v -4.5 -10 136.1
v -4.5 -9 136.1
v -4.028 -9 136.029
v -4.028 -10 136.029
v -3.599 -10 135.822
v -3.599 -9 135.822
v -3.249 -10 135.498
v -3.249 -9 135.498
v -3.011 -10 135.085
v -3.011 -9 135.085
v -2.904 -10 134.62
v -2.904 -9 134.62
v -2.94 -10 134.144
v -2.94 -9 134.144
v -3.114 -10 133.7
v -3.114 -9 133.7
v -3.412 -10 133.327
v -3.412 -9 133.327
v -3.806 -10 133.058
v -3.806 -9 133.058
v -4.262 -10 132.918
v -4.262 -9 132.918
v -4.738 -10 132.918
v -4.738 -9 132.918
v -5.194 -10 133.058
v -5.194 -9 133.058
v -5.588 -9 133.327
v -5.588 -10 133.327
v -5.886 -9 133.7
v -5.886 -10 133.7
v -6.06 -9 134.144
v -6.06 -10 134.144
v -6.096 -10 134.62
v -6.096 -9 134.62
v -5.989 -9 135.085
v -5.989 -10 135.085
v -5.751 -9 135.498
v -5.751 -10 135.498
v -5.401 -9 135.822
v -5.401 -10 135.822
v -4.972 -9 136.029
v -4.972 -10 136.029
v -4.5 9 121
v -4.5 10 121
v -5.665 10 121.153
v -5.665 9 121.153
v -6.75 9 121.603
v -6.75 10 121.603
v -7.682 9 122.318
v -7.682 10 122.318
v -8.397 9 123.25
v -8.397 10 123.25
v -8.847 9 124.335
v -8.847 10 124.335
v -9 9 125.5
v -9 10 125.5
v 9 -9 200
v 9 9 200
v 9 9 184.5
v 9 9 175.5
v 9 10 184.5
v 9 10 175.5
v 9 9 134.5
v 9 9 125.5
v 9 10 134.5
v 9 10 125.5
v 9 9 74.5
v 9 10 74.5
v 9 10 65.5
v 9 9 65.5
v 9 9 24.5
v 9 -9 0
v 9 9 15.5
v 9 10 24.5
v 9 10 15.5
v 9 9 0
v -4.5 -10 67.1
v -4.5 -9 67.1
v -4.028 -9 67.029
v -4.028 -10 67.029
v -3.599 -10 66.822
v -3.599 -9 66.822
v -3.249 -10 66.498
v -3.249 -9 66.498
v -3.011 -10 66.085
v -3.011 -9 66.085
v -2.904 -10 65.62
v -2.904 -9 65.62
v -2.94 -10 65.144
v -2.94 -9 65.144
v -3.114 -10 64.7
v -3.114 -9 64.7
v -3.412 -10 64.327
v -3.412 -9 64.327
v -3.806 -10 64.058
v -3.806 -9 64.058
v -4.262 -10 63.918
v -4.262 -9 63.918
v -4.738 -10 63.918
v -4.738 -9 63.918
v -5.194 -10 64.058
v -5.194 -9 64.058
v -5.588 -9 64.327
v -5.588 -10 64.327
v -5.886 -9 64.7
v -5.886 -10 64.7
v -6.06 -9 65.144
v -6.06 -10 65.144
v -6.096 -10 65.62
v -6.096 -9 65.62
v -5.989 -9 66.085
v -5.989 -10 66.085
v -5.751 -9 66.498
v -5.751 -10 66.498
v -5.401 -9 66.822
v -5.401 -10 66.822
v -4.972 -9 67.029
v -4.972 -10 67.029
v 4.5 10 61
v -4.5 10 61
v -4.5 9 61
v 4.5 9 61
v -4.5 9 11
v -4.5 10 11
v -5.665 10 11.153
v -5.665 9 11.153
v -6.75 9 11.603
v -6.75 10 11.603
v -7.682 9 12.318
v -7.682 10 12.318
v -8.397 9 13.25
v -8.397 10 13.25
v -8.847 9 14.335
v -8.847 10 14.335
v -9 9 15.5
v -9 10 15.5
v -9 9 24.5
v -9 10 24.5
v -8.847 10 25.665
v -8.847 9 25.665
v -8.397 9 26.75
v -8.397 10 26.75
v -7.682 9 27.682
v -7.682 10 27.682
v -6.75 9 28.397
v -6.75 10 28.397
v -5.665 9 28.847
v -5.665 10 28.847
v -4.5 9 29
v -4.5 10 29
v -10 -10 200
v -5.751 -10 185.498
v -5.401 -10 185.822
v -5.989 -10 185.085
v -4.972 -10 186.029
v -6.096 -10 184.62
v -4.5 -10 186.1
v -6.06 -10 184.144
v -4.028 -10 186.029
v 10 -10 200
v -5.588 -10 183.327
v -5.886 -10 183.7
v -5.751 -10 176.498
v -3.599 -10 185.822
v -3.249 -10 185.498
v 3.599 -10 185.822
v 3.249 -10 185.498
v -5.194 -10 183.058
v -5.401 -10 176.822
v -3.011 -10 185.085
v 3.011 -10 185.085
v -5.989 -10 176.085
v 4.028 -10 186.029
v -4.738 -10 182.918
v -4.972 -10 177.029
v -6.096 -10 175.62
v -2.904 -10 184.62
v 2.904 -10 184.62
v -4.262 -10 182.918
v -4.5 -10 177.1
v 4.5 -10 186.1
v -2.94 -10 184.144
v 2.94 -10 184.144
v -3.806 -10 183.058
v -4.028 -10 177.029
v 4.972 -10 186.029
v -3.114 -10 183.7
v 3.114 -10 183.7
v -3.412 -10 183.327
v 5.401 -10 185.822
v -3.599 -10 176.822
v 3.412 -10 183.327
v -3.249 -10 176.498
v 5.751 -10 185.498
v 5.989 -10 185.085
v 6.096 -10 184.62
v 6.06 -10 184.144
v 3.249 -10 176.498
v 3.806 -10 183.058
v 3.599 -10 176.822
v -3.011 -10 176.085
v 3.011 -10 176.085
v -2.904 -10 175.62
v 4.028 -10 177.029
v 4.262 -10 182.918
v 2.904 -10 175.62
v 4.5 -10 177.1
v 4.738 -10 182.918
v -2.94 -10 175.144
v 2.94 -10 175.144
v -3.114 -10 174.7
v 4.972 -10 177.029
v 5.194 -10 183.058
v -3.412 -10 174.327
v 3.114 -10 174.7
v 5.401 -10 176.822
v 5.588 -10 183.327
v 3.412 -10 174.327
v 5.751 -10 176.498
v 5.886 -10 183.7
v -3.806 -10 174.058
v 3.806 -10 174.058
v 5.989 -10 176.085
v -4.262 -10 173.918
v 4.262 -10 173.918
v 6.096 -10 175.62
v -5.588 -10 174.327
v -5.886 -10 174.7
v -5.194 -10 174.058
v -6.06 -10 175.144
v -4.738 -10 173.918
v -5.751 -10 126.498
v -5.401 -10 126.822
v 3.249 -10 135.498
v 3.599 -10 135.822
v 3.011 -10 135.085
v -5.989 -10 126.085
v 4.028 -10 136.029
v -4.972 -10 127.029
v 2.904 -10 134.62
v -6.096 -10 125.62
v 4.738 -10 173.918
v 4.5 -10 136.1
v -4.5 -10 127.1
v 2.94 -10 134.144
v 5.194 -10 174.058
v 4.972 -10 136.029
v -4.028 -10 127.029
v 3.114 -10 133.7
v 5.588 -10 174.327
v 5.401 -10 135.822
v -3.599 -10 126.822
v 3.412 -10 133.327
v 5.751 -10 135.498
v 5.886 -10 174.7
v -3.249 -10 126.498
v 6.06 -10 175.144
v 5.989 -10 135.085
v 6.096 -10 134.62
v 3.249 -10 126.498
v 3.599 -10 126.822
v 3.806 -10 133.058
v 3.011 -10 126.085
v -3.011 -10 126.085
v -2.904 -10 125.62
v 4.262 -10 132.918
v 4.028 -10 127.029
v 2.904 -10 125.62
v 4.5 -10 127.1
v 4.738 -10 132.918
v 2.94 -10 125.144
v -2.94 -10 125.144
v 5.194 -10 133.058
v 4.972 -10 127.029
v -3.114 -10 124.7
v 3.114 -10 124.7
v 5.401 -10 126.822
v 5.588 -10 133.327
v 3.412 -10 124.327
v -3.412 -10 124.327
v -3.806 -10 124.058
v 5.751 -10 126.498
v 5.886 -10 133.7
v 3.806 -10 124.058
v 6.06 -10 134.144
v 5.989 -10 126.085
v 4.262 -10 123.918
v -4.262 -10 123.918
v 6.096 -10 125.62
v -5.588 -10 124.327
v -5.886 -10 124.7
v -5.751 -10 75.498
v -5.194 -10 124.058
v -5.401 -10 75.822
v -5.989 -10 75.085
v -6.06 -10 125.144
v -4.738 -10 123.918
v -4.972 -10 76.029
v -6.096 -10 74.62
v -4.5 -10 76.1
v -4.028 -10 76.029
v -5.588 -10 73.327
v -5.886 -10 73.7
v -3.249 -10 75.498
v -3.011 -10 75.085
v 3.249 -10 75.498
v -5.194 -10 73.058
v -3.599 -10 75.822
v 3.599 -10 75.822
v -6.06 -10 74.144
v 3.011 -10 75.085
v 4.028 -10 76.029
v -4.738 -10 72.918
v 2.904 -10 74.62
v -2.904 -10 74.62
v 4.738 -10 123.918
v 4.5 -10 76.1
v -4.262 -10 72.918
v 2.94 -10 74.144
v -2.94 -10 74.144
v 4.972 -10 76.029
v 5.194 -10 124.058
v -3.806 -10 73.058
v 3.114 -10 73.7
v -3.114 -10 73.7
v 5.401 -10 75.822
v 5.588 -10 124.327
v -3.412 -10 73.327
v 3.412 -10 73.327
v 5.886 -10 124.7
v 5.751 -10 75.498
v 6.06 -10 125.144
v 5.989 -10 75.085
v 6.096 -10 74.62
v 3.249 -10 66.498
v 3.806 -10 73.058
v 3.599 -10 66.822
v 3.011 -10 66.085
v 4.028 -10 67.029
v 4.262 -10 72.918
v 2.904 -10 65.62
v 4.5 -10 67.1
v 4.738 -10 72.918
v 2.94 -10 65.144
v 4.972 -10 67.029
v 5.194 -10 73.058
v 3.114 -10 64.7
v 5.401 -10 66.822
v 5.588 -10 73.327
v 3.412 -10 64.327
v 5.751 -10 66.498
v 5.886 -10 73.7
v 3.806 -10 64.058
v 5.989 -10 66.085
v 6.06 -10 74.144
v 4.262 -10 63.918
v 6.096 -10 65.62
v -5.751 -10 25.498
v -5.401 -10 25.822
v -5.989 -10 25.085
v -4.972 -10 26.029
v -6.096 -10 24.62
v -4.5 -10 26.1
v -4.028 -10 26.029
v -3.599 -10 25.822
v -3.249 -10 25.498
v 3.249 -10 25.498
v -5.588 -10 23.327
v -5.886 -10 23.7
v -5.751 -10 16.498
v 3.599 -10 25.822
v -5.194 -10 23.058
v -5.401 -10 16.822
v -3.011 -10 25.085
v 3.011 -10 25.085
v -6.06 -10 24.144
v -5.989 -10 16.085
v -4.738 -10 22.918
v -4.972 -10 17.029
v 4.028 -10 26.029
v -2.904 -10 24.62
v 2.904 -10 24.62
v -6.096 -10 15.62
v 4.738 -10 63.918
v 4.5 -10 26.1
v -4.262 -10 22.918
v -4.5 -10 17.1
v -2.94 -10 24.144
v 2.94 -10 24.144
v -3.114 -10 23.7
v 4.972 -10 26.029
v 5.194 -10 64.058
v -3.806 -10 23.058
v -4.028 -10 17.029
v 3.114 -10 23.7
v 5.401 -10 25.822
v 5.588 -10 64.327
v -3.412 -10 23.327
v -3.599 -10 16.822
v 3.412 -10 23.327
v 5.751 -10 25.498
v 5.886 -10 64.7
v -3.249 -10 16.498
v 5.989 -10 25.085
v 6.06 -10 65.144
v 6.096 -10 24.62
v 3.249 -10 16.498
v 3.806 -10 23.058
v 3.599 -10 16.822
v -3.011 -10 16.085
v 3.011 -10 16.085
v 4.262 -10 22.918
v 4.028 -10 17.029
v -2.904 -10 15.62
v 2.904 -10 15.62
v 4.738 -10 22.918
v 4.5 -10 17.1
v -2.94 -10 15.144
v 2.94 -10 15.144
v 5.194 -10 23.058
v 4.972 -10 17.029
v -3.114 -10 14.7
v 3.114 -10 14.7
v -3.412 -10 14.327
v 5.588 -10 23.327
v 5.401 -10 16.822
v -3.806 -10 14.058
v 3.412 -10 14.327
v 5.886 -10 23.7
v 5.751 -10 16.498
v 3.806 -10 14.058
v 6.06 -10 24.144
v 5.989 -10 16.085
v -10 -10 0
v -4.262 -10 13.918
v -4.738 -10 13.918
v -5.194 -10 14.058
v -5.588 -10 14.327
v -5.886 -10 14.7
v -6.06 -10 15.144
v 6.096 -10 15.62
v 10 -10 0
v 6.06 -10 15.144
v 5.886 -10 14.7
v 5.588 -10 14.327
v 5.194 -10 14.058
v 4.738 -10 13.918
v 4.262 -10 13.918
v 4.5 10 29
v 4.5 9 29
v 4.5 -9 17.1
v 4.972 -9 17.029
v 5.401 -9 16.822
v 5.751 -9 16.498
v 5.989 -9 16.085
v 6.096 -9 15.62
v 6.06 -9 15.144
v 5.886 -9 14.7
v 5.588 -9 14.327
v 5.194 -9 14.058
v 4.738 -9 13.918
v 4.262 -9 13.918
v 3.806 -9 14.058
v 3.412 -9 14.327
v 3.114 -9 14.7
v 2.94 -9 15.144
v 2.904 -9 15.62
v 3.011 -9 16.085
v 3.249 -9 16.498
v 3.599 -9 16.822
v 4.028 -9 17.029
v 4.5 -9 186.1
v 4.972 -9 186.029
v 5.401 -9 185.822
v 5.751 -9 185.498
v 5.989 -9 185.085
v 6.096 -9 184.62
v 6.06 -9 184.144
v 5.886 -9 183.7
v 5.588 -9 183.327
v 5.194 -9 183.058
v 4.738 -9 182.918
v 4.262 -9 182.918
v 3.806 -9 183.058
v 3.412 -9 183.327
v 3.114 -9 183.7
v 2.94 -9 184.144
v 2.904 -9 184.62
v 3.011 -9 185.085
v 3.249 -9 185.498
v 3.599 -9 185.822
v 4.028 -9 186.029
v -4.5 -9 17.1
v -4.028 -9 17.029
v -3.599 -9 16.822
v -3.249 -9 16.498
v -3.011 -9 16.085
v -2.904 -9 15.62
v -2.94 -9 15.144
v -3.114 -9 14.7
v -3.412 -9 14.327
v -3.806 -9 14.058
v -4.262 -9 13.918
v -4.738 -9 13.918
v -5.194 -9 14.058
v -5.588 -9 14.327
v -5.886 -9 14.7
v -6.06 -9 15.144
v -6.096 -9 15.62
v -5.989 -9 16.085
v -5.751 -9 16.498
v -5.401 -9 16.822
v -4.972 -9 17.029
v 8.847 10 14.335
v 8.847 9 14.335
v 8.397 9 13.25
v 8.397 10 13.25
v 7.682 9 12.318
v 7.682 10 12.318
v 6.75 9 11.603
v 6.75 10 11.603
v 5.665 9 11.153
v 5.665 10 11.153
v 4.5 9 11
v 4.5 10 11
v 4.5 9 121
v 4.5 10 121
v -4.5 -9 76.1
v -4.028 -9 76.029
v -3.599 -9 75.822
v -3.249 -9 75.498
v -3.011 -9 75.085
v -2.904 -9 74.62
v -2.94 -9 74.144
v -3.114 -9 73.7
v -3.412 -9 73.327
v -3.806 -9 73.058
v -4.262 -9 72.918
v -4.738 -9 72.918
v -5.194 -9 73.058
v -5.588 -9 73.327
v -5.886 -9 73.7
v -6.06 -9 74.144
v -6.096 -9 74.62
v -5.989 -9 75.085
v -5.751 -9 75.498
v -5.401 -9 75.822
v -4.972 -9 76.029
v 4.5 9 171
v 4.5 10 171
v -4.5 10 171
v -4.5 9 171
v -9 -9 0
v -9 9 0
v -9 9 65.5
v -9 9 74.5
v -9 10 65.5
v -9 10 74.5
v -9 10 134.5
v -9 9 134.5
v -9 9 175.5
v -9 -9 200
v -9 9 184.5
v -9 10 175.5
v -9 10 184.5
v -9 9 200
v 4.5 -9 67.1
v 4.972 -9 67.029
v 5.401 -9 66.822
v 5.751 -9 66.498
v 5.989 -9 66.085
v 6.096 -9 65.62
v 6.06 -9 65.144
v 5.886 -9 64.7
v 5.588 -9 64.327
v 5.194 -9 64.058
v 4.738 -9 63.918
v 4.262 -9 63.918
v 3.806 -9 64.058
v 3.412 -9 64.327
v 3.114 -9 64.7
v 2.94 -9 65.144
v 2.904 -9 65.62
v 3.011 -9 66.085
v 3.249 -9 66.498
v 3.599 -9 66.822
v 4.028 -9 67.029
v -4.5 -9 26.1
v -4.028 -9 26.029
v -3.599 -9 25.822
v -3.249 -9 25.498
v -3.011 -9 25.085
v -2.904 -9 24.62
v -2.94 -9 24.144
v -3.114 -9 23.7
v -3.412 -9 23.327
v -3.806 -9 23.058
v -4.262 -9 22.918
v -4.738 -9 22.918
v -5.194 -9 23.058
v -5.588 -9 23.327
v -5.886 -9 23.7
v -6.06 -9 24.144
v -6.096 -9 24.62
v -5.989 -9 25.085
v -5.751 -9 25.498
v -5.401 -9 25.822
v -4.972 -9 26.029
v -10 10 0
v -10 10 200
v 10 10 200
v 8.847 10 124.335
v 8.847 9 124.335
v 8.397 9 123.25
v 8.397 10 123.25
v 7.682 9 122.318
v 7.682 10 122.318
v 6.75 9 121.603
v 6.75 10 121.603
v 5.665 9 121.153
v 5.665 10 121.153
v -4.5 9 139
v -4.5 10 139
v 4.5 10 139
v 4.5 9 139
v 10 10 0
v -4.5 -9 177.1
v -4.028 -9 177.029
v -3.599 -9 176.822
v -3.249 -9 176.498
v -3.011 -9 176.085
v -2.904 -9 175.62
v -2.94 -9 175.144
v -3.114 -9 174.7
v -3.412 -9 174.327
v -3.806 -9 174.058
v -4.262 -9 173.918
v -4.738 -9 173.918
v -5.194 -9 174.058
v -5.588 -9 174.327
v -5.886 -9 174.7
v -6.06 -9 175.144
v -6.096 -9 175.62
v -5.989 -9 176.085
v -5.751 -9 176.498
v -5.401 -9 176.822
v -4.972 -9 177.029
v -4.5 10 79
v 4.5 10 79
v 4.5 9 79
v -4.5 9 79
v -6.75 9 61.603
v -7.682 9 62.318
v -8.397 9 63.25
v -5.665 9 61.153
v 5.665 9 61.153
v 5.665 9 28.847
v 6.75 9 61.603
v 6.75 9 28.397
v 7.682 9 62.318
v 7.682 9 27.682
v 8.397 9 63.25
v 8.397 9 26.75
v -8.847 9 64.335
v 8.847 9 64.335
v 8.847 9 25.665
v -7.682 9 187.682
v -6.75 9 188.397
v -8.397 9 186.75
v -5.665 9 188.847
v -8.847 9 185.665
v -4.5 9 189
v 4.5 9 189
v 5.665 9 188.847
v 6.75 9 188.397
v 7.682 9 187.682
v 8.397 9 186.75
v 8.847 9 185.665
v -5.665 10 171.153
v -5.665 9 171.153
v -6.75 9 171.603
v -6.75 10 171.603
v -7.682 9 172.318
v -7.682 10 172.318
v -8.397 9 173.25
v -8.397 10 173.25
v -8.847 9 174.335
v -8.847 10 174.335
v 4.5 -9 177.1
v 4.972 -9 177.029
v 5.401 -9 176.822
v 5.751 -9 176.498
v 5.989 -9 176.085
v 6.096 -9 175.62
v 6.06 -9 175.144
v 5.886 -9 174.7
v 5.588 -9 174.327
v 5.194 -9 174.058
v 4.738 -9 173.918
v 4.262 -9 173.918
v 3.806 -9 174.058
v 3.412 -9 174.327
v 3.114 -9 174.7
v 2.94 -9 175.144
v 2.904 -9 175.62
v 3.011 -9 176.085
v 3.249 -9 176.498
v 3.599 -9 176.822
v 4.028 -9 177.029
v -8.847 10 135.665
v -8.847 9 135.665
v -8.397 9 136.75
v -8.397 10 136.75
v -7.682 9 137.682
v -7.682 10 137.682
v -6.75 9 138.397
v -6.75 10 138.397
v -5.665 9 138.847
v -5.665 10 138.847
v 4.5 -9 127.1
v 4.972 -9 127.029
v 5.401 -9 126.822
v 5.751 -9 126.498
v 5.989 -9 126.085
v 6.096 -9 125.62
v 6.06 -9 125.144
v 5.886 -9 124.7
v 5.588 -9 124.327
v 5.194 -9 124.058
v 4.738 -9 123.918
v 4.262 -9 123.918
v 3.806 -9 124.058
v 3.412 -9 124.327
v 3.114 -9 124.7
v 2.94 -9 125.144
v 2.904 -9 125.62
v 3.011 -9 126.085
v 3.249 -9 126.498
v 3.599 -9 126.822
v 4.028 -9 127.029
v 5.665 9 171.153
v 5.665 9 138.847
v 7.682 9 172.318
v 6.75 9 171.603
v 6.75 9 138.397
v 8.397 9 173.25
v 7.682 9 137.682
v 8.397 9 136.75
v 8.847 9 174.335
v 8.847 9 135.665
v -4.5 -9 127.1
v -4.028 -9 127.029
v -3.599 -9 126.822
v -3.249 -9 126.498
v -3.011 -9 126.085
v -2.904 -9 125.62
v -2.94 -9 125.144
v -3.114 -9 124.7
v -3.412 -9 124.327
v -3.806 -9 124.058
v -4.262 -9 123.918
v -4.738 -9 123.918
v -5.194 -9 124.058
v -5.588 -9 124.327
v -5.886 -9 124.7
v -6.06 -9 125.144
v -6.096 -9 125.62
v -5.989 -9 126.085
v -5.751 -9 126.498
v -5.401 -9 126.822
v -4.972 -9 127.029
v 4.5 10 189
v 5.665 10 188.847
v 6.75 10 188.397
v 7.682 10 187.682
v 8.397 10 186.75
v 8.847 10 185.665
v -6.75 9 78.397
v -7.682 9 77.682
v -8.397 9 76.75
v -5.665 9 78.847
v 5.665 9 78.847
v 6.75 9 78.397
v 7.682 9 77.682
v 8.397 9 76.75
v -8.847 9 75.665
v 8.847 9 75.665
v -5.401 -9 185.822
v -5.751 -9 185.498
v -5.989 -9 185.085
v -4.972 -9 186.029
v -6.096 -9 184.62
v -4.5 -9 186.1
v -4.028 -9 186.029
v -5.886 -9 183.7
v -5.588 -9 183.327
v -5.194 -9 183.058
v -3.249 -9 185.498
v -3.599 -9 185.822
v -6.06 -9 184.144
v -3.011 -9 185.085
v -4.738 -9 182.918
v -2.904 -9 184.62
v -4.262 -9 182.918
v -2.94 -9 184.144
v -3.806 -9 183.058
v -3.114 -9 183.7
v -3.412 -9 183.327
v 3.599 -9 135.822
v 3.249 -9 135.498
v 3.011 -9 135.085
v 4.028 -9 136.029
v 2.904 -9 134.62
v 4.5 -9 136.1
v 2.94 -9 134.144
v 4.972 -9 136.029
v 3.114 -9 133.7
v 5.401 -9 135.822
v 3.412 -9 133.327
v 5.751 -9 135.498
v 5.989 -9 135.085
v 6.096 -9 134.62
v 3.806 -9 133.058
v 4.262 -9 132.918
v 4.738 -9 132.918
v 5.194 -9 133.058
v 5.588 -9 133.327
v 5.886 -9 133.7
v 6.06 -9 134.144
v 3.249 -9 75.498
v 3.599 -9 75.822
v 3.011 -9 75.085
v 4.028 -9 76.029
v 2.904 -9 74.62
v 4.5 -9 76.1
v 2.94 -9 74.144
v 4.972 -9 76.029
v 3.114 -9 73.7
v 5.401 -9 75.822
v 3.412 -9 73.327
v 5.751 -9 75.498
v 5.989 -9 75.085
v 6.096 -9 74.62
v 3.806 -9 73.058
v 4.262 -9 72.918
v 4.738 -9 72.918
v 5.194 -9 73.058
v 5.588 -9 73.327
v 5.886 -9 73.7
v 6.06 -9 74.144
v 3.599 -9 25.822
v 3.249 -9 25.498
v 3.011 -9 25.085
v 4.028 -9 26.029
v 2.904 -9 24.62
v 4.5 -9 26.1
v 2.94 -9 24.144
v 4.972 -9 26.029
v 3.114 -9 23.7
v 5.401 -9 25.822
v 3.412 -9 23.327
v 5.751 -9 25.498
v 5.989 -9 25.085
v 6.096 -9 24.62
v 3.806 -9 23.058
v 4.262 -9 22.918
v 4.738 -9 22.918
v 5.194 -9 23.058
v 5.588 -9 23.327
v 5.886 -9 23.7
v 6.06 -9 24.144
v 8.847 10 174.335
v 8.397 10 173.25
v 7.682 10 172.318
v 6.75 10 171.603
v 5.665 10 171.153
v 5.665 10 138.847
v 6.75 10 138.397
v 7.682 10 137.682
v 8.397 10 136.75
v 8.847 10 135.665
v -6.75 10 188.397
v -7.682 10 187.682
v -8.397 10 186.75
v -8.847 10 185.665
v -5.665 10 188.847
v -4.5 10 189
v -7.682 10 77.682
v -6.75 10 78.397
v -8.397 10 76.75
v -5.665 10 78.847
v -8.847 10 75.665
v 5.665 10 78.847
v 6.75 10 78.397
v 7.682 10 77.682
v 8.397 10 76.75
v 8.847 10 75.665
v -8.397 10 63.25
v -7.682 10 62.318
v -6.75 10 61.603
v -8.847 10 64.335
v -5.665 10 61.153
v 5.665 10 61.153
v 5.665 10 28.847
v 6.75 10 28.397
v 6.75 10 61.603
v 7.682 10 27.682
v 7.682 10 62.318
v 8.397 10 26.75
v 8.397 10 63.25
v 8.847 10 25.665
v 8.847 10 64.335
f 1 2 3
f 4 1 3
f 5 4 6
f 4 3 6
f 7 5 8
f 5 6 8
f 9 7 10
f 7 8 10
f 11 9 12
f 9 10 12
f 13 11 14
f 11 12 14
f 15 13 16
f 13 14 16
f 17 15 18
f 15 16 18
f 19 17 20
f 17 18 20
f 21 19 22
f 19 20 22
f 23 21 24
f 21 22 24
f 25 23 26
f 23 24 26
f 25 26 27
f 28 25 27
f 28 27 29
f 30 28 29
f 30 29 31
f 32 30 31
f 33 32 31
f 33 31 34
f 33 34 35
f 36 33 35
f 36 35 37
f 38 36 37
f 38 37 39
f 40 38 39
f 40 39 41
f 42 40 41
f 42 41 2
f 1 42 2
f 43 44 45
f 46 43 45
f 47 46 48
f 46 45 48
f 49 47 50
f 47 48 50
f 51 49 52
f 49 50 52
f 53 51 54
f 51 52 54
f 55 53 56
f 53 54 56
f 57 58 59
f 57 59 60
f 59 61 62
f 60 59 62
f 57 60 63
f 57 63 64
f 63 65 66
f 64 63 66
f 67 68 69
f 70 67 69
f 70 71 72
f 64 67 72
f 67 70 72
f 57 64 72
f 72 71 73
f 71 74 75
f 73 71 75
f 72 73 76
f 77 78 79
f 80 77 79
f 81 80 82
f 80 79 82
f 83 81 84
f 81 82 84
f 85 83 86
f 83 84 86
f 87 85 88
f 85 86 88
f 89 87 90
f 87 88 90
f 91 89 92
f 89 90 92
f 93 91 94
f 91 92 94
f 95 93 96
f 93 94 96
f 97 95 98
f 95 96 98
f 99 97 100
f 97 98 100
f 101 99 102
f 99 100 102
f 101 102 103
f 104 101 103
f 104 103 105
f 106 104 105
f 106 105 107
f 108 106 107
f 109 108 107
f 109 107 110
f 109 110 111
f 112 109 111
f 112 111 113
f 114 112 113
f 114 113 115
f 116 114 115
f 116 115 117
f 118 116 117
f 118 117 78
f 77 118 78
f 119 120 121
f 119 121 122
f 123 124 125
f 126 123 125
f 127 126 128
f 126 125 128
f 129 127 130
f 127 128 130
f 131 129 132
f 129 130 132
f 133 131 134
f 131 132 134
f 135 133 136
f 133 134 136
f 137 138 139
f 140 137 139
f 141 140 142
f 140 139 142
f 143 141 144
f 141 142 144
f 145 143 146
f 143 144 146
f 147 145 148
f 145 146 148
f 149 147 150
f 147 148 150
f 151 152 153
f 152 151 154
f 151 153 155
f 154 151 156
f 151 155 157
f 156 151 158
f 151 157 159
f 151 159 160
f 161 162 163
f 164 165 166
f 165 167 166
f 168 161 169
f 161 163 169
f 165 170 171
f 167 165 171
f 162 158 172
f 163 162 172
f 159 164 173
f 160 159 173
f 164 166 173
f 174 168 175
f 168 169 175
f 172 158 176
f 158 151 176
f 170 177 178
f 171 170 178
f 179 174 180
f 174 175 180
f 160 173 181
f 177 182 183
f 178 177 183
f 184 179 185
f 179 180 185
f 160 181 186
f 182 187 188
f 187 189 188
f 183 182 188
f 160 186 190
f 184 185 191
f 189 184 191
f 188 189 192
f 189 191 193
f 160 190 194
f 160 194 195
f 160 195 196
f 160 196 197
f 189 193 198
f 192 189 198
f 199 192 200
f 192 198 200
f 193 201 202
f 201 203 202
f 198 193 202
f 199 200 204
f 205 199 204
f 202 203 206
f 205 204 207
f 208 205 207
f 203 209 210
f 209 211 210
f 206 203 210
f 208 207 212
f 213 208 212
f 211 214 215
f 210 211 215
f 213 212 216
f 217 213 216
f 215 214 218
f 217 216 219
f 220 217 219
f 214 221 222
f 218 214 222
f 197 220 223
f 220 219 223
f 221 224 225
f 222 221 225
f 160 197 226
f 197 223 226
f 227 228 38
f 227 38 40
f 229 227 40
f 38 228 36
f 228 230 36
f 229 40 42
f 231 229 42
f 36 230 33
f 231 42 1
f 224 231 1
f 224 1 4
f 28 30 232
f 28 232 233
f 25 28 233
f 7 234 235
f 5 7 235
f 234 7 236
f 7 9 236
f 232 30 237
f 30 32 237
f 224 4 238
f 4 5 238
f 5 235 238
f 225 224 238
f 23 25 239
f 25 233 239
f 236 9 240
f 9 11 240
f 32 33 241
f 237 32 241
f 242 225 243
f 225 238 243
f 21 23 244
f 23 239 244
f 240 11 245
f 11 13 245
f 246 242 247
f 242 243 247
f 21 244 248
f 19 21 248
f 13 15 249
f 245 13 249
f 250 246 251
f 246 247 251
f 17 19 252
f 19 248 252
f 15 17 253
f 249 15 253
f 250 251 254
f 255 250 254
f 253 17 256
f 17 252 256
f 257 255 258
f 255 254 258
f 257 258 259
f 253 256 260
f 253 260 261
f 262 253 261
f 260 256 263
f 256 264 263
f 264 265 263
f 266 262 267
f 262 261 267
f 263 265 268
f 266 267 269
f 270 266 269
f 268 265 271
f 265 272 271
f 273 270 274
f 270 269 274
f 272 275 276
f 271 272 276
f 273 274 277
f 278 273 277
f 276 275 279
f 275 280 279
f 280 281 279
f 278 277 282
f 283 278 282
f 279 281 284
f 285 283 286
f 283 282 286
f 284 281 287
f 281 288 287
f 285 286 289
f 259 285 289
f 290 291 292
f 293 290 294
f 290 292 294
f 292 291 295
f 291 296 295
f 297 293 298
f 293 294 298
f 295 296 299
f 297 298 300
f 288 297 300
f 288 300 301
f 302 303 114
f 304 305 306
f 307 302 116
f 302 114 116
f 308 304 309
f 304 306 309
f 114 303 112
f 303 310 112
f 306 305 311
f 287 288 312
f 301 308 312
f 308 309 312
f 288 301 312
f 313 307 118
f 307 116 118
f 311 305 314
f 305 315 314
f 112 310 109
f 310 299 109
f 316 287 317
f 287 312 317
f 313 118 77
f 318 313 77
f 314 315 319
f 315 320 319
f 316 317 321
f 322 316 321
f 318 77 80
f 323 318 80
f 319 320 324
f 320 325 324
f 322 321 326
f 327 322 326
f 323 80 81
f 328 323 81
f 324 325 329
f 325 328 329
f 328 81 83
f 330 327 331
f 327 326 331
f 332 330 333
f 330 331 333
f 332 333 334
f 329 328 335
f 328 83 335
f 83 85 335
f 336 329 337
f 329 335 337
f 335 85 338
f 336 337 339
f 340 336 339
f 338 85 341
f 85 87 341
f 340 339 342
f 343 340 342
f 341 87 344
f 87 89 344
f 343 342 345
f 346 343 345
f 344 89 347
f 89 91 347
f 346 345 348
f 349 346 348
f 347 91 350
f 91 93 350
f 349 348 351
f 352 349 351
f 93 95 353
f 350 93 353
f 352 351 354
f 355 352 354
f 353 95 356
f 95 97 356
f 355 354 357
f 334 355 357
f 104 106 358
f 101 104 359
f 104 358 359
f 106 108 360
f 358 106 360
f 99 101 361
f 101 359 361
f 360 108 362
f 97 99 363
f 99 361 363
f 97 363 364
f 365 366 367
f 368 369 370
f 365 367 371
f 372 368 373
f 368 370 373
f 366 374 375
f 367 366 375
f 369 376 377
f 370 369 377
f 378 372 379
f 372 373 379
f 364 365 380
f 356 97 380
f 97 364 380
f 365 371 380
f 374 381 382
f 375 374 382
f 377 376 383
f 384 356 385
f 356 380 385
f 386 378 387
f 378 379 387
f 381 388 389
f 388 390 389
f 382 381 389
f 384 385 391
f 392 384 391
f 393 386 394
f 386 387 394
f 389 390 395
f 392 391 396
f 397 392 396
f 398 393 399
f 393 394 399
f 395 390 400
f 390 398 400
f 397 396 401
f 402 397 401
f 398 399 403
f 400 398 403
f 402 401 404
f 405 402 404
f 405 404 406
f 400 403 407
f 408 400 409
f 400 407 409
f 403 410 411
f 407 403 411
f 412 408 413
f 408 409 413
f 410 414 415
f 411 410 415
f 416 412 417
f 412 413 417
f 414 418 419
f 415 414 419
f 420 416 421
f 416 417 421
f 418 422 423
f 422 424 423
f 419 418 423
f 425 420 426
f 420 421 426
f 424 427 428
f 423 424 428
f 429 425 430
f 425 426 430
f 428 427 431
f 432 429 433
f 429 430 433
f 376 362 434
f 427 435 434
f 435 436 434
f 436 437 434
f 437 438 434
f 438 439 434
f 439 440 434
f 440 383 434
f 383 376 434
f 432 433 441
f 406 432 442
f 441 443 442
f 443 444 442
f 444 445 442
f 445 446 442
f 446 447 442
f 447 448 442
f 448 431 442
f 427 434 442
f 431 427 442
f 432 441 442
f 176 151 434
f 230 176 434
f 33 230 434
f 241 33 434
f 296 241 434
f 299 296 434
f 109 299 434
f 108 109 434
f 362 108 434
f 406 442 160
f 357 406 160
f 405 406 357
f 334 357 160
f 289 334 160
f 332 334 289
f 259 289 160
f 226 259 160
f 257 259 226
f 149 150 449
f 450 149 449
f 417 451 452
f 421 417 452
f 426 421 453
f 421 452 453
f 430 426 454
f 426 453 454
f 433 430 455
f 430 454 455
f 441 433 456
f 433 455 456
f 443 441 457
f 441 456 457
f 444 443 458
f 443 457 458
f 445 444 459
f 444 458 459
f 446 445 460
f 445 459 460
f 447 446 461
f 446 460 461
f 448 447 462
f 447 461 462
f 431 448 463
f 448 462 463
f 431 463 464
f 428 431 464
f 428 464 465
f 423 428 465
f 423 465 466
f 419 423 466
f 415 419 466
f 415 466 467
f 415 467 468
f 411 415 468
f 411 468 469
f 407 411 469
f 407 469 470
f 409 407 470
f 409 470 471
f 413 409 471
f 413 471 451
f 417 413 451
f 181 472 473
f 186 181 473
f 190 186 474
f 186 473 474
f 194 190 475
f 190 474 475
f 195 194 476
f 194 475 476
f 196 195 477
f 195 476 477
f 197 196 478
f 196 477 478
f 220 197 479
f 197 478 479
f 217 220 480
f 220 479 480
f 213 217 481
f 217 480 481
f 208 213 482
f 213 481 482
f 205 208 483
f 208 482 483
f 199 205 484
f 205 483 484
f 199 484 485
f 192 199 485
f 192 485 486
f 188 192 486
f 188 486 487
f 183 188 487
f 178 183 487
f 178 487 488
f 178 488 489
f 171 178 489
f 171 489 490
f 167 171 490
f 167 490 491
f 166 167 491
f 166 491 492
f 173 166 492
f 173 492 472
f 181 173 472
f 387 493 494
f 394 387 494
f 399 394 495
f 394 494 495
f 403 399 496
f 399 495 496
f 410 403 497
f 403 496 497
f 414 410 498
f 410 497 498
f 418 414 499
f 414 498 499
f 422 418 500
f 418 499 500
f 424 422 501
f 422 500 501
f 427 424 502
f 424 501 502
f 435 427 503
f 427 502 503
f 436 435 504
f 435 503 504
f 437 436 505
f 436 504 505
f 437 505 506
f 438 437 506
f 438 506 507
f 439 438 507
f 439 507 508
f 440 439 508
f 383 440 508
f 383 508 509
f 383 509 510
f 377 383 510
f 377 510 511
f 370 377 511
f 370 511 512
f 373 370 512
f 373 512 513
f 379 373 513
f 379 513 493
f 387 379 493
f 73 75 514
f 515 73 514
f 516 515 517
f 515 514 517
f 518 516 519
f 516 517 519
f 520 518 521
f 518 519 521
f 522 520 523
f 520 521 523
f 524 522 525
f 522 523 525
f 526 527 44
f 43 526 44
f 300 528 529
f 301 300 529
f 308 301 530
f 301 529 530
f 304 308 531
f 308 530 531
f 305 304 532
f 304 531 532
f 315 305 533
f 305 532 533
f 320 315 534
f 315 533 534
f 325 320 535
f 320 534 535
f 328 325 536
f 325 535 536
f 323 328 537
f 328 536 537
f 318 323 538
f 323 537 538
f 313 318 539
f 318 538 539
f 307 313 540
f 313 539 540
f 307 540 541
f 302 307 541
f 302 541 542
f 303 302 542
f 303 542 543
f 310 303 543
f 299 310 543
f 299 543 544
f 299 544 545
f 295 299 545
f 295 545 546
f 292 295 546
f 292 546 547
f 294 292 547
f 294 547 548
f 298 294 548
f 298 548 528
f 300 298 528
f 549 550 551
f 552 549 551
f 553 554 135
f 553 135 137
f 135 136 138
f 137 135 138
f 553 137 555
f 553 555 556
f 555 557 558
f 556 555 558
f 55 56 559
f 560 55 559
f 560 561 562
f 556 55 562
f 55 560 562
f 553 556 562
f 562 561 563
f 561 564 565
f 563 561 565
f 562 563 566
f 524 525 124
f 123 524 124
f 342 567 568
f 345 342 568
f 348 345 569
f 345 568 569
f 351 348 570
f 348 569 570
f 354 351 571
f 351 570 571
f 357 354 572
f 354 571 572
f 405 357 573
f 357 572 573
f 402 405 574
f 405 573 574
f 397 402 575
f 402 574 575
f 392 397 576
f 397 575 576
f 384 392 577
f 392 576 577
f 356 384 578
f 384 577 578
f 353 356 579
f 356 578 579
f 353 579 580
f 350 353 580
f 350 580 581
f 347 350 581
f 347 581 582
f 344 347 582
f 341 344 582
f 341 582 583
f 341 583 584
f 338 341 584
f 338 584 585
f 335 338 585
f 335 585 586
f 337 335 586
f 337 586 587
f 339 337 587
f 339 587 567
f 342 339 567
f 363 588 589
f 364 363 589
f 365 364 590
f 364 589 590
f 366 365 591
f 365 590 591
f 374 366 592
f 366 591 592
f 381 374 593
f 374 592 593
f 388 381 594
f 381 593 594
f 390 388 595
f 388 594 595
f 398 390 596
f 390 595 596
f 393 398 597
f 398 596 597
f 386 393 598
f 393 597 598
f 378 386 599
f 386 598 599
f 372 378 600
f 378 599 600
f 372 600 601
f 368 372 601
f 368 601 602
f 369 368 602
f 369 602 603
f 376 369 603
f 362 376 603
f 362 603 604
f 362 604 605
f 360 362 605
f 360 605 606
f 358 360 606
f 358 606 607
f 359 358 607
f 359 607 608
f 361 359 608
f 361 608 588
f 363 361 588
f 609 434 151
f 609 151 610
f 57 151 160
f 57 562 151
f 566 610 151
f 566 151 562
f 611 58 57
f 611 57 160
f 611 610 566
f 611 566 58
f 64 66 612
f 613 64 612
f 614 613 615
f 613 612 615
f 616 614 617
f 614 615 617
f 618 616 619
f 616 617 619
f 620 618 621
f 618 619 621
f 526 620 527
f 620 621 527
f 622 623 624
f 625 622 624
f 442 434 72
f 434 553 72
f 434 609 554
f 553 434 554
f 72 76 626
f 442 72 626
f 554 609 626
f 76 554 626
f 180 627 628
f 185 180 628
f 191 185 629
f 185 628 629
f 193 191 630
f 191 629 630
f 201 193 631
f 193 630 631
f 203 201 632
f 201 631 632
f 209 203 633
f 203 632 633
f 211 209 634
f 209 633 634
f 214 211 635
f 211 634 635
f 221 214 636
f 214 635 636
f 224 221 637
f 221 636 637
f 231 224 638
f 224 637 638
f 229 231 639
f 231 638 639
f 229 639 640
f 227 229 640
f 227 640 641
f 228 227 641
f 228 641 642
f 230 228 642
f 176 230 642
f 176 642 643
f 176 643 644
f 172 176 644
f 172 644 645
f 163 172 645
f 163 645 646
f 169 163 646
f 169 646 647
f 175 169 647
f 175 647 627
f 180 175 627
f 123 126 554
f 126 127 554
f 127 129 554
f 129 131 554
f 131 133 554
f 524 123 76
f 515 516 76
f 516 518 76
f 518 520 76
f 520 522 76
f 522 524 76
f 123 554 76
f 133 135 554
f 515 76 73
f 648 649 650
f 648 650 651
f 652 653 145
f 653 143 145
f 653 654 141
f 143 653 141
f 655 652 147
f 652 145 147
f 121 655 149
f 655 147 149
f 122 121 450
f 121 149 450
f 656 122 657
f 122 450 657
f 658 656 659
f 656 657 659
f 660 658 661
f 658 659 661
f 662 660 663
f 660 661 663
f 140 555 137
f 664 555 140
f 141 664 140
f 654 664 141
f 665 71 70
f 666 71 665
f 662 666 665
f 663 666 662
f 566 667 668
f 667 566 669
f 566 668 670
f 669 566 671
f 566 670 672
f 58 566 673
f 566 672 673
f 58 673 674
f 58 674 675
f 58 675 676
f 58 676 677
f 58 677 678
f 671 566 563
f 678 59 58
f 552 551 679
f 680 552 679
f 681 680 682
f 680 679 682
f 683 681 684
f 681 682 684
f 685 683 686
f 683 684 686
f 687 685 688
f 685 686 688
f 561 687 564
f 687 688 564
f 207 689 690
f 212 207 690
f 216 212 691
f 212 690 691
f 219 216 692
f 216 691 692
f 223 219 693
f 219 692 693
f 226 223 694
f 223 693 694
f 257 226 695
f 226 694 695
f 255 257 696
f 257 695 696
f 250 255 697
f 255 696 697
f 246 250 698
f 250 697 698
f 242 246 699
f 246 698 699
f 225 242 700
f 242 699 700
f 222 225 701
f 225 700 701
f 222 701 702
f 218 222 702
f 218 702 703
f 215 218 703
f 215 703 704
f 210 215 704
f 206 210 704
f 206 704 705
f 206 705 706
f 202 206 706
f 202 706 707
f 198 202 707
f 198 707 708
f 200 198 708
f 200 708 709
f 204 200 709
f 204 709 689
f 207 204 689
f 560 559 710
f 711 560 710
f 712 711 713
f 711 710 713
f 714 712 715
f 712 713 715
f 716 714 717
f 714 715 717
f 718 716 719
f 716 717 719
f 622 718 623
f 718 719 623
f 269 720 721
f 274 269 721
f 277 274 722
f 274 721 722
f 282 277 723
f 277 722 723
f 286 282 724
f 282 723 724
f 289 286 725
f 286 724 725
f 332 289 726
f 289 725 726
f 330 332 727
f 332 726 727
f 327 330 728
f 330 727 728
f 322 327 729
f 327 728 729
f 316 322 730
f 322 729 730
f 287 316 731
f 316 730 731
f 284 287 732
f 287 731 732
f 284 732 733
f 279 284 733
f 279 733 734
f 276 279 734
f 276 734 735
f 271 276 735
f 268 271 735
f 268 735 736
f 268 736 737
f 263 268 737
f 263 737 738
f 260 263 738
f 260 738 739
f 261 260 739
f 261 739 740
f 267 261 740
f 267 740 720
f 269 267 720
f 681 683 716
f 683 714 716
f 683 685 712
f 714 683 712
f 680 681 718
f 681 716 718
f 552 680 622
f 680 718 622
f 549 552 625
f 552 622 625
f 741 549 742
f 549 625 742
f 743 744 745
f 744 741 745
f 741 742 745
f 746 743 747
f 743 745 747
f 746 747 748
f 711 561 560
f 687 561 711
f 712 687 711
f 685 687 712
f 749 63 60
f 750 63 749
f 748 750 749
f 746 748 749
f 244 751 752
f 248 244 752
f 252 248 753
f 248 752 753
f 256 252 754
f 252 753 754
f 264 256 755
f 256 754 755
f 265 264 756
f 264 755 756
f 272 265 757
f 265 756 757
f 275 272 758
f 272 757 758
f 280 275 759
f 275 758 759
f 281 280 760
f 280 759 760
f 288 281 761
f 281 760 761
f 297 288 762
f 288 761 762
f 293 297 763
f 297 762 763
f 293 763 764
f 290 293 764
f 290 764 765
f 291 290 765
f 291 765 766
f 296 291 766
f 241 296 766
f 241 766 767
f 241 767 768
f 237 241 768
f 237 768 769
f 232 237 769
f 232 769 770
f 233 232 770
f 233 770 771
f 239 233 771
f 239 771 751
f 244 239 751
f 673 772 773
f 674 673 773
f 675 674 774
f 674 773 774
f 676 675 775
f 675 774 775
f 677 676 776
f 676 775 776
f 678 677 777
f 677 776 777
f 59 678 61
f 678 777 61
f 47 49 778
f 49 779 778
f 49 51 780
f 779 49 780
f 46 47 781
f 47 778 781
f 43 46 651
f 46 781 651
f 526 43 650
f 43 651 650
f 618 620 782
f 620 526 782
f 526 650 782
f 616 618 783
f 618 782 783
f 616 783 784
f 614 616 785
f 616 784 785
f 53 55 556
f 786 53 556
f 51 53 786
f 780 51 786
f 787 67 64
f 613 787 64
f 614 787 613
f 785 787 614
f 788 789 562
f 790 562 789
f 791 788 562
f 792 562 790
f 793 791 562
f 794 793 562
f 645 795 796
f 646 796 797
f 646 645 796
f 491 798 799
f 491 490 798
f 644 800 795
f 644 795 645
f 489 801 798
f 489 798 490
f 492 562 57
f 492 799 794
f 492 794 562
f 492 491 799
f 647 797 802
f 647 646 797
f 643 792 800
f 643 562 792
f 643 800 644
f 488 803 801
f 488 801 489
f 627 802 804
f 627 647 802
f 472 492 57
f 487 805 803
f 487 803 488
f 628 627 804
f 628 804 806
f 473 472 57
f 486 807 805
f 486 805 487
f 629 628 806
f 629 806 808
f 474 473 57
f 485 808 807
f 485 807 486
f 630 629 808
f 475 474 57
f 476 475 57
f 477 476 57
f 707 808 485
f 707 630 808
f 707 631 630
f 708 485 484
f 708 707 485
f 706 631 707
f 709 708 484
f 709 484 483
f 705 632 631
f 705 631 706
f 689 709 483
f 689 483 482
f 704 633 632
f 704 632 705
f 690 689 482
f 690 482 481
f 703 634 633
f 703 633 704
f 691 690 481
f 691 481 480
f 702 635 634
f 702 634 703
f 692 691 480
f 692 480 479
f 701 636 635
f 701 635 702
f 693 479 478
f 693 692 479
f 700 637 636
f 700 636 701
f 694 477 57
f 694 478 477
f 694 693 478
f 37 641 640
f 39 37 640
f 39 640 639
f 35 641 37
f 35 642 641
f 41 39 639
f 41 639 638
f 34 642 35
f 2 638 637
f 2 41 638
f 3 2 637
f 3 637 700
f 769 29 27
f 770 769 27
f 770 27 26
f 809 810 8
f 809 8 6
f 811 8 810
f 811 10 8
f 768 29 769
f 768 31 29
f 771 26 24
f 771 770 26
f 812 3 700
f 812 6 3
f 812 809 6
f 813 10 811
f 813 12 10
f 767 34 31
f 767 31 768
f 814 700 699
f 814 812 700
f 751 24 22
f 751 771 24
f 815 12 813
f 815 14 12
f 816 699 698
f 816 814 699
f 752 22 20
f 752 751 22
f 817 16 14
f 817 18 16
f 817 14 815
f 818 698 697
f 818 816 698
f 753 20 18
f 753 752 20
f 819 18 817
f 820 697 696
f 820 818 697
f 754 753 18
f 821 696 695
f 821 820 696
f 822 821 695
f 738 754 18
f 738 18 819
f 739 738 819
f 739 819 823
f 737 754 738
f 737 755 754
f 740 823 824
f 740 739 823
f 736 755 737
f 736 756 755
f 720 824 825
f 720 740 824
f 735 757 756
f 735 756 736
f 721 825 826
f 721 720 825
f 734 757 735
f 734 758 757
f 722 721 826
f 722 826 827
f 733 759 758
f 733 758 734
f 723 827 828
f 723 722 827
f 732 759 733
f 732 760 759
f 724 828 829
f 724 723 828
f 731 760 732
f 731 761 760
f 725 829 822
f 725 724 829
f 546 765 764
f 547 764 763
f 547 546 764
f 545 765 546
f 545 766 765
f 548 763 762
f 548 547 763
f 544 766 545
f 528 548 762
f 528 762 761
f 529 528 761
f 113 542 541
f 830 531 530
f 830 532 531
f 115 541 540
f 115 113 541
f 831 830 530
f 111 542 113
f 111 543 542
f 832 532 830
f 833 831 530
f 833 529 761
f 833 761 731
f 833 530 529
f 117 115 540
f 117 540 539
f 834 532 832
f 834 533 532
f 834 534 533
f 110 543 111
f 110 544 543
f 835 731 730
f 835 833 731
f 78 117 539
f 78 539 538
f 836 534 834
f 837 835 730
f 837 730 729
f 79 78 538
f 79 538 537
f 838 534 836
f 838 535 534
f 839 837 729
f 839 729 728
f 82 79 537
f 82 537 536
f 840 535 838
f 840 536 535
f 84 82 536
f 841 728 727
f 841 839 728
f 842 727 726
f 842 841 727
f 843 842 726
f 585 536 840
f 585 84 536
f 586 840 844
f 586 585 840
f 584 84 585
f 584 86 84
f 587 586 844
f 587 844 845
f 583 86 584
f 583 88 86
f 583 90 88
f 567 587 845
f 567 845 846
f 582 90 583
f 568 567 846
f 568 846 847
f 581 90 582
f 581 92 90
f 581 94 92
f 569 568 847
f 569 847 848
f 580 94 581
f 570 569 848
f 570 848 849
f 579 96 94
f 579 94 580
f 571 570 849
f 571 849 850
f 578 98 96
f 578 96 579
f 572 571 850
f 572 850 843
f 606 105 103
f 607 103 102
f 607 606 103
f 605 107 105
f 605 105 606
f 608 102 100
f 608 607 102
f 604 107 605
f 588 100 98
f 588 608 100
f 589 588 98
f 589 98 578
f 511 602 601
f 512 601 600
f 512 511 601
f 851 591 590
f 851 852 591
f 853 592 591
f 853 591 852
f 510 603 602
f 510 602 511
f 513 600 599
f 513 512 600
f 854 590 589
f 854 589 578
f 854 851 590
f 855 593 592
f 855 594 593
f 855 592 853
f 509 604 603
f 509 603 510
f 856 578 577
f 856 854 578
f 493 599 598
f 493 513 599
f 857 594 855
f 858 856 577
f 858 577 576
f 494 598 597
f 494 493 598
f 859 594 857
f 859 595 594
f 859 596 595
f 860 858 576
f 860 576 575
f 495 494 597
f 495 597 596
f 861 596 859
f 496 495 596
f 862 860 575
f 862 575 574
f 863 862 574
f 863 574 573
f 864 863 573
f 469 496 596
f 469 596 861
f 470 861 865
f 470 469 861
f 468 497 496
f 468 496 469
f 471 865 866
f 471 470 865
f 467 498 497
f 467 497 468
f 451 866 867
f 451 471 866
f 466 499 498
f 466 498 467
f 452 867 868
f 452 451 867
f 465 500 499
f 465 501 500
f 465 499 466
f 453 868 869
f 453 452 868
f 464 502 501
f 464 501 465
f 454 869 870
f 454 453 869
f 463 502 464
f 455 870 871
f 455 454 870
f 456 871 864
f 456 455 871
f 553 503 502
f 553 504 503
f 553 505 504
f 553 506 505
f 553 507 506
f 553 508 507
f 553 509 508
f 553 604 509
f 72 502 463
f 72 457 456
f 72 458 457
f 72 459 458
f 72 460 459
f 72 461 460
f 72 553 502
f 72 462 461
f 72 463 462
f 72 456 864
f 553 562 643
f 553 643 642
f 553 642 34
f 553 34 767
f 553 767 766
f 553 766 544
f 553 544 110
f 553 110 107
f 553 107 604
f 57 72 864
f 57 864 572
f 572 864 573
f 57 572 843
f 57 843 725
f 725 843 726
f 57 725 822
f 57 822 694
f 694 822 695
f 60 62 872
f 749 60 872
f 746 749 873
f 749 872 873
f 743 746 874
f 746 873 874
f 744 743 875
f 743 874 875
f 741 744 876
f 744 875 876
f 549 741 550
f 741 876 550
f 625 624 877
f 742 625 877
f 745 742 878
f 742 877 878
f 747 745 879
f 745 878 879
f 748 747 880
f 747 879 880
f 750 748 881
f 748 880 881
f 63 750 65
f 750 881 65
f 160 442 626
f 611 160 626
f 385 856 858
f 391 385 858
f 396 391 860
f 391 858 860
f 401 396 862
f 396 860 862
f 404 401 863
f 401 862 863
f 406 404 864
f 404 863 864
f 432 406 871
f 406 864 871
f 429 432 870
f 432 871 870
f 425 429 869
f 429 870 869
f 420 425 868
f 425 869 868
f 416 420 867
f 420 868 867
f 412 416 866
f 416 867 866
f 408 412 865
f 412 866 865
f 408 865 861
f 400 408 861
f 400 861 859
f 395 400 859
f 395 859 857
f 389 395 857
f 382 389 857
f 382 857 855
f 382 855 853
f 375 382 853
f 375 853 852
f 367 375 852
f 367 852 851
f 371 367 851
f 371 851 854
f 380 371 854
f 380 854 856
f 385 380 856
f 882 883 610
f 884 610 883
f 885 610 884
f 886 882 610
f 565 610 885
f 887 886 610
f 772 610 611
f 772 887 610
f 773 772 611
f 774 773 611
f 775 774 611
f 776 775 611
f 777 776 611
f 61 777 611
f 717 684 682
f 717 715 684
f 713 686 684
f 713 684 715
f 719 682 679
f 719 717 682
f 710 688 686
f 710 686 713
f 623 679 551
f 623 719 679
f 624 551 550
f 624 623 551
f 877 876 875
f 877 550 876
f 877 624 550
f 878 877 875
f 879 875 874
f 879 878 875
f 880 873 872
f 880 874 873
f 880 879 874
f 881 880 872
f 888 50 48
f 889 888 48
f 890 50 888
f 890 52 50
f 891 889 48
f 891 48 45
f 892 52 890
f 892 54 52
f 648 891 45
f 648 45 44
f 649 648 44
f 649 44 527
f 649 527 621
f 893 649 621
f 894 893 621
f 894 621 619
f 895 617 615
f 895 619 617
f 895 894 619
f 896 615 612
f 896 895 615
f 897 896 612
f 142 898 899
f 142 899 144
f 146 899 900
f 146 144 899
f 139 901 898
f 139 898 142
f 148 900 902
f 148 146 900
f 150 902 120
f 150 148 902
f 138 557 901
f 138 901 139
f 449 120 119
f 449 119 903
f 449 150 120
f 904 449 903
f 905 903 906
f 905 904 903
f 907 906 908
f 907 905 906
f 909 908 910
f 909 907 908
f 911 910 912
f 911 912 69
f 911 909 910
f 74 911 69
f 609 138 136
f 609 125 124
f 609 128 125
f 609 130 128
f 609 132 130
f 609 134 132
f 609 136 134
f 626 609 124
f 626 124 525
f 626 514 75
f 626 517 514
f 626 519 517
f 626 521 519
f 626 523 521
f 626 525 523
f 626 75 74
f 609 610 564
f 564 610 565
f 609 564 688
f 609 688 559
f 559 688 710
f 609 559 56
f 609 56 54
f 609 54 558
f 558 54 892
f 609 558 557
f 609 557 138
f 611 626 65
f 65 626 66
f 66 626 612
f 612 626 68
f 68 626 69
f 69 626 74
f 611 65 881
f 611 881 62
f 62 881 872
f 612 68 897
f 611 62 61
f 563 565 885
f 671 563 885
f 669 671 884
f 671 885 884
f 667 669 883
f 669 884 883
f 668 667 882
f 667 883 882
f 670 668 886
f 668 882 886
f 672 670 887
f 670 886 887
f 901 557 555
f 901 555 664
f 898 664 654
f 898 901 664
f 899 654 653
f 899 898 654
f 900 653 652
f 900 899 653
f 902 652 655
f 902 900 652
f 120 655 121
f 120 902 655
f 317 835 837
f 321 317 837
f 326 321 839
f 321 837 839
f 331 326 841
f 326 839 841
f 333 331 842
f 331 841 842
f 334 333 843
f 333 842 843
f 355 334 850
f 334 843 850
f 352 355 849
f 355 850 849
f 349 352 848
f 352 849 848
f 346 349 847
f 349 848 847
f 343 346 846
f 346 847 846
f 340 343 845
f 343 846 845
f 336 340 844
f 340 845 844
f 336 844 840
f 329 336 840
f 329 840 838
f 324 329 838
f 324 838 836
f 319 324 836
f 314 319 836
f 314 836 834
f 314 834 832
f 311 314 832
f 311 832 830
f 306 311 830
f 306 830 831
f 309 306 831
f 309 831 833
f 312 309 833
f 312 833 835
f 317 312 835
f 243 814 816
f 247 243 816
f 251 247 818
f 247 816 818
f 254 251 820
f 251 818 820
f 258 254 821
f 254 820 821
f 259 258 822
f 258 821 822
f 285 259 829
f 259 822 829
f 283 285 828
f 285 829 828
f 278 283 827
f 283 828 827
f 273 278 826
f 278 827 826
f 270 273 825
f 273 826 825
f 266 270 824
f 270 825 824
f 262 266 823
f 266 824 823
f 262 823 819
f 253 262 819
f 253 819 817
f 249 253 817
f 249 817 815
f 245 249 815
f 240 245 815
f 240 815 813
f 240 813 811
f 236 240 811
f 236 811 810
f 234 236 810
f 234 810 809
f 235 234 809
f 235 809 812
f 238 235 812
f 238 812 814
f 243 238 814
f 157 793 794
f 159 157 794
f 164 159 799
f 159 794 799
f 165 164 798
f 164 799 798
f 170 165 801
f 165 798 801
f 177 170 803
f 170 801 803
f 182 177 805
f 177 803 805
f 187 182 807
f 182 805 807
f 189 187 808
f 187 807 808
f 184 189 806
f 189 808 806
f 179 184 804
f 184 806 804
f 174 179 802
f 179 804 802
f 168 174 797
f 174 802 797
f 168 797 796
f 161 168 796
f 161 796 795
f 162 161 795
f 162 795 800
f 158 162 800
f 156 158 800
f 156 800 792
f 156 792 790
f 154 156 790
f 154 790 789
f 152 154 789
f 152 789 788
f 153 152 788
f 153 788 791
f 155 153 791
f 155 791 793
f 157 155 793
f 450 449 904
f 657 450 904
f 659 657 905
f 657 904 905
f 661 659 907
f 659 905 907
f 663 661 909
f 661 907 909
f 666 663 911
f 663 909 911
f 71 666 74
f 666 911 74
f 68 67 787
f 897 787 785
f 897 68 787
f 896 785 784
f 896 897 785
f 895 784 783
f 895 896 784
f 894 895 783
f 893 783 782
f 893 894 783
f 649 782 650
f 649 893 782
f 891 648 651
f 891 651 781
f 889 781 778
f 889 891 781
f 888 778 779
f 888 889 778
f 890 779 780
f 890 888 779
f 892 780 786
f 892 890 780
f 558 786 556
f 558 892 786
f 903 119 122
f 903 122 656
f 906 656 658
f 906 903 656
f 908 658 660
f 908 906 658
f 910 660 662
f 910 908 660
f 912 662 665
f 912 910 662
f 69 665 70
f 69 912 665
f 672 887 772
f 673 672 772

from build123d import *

# Parameters (mm, degrees)
SKETCH_1_W          = 20
SKETCH_1_H          = 20
SKETCH_1_W_2        = 18
SKETCH_1_H_2        = 18
EXTRUDE_1_DEPTH     = 200
SKETCH_3_R          = 1.6
CUT_EXTRUDE_1_DEPTH = 202.246117975
CUT_EXTRUDE_2_REACH = 203.246


with BuildPart() as part:
    # 草图1 → 凸台-拉伸1 (new body)
    with BuildSketch(Plane.XY):
        Rectangle(SKETCH_1_W, SKETCH_1_H)
        Rectangle(SKETCH_1_W_2, SKETCH_1_H_2, mode=Mode.SUBTRACT)
    extrude(amount=EXTRUDE_1_DEPTH)

    # 草图3 → 切除-拉伸1 (cut, through all)
    with BuildSketch(Plane(origin=(0, 10, 0), x_dir=(1, 0, 0), z_dir=(0, 1, 0))):
        with Locations(Location((-4.5, -134.5, 0), (0, 0, 270))):
            Circle(SKETCH_3_R)
        with Locations(Location((4.5, -134.5, 0), (0, 0, 270))):
            Circle(SKETCH_3_R)
        with Locations(Location((4.5, -125.5, 0), (0, 0, 270))):
            Circle(SKETCH_3_R)
        with Locations(Location((-4.5, -125.5, 0), (0, 0, 270))):
            Circle(SKETCH_3_R)
        with Locations(Location((4.5, -65.5, 0), (0, 0, 270))):
            Circle(SKETCH_3_R)
        with Locations(Location((4.5, -74.5, 0), (0, 0, 270))):
            Circle(SKETCH_3_R)
        with Locations(Location((-4.5, -74.5, 0), (0, 0, 270))):
            Circle(SKETCH_3_R)
        with Locations(Location((-4.5, -65.5, 0), (0, 0, 270))):
            Circle(SKETCH_3_R)
        with Locations(Location((-4.5, -184.5, 0), (0, 0, 270))):
            Circle(SKETCH_3_R)
        with Locations(Location((4.5, -184.5, 0), (0, 0, 270))):
            Circle(SKETCH_3_R)
        with Locations(Location((4.5, -175.5, 0), (0, 0, 270))):
            Circle(SKETCH_3_R)
        with Locations(Location((-4.5, -175.5, 0), (0, 0, 270))):
            Circle(SKETCH_3_R)
        with Locations(Location((-4.5, -24.5, 0), (0, 0, 270))):
            Circle(SKETCH_3_R)
        with Locations(Location((4.5, -24.5, 0), (0, 0, 270))):
            Circle(SKETCH_3_R)
        with Locations(Location((4.5, -15.5, 0), (0, 0, 270))):
            Circle(SKETCH_3_R)
        with Locations(Location((-4.5, -15.5, 0), (0, 0, 270))):
            Circle(SKETCH_3_R)
    extrude(amount=-CUT_EXTRUDE_1_DEPTH, mode=Mode.SUBTRACT)

    # 草图4 → 切除-拉伸2 (cut, up to next)
    with BuildSketch(Plane(origin=(0, 10, 0), x_dir=(1, 0, 0), z_dir=(0, 1, 0)), mode=Mode.PRIVATE) as cut_extrude_2_sk1:
        with BuildLine():
            Line((4.5, -11), (-4.5, -11))
            ThreePointArc((-4.5, -11), (-7.681980515, -12.318019485), (-9, -15.5))
            Line((-9, -15.5), (-9, -24.5))
            ThreePointArc((-9, -24.5), (-7.681980515, -27.681980515), (-4.5, -29))
            Line((-4.5, -29), (4.5, -29))
            ThreePointArc((4.5, -29), (7.681980515, -27.681980515), (9, -24.5))
            Line((9, -24.5), (9, -15.5))
            ThreePointArc((9, -15.5), (7.681980515, -12.318019485), (4.5, -11))
        make_face()
    cut_extrude_2_tool1 = extrude(cut_extrude_2_sk1.sketch, amount=-CUT_EXTRUDE_2_REACH, mode=Mode.PRIVATE) & part.part
    # 草图4 → 切除-拉伸2 (cut, up to next)
    with BuildSketch(Plane(origin=(0, 10, 0), x_dir=(1, 0, 0), z_dir=(0, 1, 0)), mode=Mode.PRIVATE) as cut_extrude_2_sk2:
        with BuildLine():
            Line((4.5, -79), (-4.5, -79))
            ThreePointArc((-4.5, -79), (-7.681980515, -77.681980515), (-9, -74.5))
            Line((-9, -74.5), (-9, -65.5))
            ThreePointArc((-9, -65.5), (-7.681980515, -62.318019485), (-4.5, -61))
            Line((-4.5, -61), (4.5, -61))
            ThreePointArc((4.5, -61), (7.681980515, -62.318019485), (9, -65.5))
            Line((9, -65.5), (9, -74.5))
            ThreePointArc((9, -74.5), (7.681980515, -77.681980515), (4.5, -79))
        make_face()
    cut_extrude_2_tool2 = extrude(cut_extrude_2_sk2.sketch, amount=-CUT_EXTRUDE_2_REACH, mode=Mode.PRIVATE) & part.part
    # 草图4 → 切除-拉伸2 (cut, up to next)
    with BuildSketch(Plane(origin=(0, 10, 0), x_dir=(1, 0, 0), z_dir=(0, 1, 0)), mode=Mode.PRIVATE) as cut_extrude_2_sk3:
        with BuildLine():
            Line((9, -134.5), (9, -125.5))
            ThreePointArc((9, -125.5), (7.681980515, -122.318019485), (4.5, -121))
            Line((4.5, -121), (-4.5, -121))
            ThreePointArc((-4.5, -121), (-7.681980515, -122.318019485), (-9, -125.5))
            Line((-9, -125.5), (-9, -134.5))
            ThreePointArc((-9, -134.5), (-7.681980515, -137.681980515), (-4.5, -139))
            Line((-4.5, -139), (4.5, -139))
            ThreePointArc((4.5, -139), (7.681980515, -137.681980515), (9, -134.5))
        make_face()
    cut_extrude_2_tool3 = extrude(cut_extrude_2_sk3.sketch, amount=-CUT_EXTRUDE_2_REACH, mode=Mode.PRIVATE) & part.part
    # 草图4 → 切除-拉伸2 (cut, up to next)
    with BuildSketch(Plane(origin=(0, 10, 0), x_dir=(1, 0, 0), z_dir=(0, 1, 0)), mode=Mode.PRIVATE) as cut_extrude_2_sk4:
        with BuildLine():
            Line((9, -184.5), (9, -175.5))
            ThreePointArc((9, -175.5), (7.681980515, -172.318019485), (4.5, -171))
            Line((4.5, -171), (-4.5, -171))
            ThreePointArc((-4.5, -171), (-7.681980515, -172.318019485), (-9, -175.5))
            Line((-9, -175.5), (-9, -184.5))
            ThreePointArc((-9, -184.5), (-7.681980515, -187.681980515), (-4.5, -189))
            Line((-4.5, -189), (4.5, -189))
            ThreePointArc((4.5, -189), (7.681980515, -187.681980515), (9, -184.5))
        make_face()
    cut_extrude_2_tool4 = extrude(cut_extrude_2_sk4.sketch, amount=-CUT_EXTRUDE_2_REACH, mode=Mode.PRIVATE) & part.part
    add(cut_extrude_2_tool1.solids().sort_by_distance((0, 10, 20))[0], mode=Mode.SUBTRACT)
    add(cut_extrude_2_tool2.solids().sort_by_distance((0, 10, 70))[0], mode=Mode.SUBTRACT)
    add(cut_extrude_2_tool3.solids().sort_by_distance((0, 10, 130))[0], mode=Mode.SUBTRACT)
    add(cut_extrude_2_tool4.solids().sort_by_distance((0, 10, 180))[0], mode=Mode.SUBTRACT)


solid = part.part
